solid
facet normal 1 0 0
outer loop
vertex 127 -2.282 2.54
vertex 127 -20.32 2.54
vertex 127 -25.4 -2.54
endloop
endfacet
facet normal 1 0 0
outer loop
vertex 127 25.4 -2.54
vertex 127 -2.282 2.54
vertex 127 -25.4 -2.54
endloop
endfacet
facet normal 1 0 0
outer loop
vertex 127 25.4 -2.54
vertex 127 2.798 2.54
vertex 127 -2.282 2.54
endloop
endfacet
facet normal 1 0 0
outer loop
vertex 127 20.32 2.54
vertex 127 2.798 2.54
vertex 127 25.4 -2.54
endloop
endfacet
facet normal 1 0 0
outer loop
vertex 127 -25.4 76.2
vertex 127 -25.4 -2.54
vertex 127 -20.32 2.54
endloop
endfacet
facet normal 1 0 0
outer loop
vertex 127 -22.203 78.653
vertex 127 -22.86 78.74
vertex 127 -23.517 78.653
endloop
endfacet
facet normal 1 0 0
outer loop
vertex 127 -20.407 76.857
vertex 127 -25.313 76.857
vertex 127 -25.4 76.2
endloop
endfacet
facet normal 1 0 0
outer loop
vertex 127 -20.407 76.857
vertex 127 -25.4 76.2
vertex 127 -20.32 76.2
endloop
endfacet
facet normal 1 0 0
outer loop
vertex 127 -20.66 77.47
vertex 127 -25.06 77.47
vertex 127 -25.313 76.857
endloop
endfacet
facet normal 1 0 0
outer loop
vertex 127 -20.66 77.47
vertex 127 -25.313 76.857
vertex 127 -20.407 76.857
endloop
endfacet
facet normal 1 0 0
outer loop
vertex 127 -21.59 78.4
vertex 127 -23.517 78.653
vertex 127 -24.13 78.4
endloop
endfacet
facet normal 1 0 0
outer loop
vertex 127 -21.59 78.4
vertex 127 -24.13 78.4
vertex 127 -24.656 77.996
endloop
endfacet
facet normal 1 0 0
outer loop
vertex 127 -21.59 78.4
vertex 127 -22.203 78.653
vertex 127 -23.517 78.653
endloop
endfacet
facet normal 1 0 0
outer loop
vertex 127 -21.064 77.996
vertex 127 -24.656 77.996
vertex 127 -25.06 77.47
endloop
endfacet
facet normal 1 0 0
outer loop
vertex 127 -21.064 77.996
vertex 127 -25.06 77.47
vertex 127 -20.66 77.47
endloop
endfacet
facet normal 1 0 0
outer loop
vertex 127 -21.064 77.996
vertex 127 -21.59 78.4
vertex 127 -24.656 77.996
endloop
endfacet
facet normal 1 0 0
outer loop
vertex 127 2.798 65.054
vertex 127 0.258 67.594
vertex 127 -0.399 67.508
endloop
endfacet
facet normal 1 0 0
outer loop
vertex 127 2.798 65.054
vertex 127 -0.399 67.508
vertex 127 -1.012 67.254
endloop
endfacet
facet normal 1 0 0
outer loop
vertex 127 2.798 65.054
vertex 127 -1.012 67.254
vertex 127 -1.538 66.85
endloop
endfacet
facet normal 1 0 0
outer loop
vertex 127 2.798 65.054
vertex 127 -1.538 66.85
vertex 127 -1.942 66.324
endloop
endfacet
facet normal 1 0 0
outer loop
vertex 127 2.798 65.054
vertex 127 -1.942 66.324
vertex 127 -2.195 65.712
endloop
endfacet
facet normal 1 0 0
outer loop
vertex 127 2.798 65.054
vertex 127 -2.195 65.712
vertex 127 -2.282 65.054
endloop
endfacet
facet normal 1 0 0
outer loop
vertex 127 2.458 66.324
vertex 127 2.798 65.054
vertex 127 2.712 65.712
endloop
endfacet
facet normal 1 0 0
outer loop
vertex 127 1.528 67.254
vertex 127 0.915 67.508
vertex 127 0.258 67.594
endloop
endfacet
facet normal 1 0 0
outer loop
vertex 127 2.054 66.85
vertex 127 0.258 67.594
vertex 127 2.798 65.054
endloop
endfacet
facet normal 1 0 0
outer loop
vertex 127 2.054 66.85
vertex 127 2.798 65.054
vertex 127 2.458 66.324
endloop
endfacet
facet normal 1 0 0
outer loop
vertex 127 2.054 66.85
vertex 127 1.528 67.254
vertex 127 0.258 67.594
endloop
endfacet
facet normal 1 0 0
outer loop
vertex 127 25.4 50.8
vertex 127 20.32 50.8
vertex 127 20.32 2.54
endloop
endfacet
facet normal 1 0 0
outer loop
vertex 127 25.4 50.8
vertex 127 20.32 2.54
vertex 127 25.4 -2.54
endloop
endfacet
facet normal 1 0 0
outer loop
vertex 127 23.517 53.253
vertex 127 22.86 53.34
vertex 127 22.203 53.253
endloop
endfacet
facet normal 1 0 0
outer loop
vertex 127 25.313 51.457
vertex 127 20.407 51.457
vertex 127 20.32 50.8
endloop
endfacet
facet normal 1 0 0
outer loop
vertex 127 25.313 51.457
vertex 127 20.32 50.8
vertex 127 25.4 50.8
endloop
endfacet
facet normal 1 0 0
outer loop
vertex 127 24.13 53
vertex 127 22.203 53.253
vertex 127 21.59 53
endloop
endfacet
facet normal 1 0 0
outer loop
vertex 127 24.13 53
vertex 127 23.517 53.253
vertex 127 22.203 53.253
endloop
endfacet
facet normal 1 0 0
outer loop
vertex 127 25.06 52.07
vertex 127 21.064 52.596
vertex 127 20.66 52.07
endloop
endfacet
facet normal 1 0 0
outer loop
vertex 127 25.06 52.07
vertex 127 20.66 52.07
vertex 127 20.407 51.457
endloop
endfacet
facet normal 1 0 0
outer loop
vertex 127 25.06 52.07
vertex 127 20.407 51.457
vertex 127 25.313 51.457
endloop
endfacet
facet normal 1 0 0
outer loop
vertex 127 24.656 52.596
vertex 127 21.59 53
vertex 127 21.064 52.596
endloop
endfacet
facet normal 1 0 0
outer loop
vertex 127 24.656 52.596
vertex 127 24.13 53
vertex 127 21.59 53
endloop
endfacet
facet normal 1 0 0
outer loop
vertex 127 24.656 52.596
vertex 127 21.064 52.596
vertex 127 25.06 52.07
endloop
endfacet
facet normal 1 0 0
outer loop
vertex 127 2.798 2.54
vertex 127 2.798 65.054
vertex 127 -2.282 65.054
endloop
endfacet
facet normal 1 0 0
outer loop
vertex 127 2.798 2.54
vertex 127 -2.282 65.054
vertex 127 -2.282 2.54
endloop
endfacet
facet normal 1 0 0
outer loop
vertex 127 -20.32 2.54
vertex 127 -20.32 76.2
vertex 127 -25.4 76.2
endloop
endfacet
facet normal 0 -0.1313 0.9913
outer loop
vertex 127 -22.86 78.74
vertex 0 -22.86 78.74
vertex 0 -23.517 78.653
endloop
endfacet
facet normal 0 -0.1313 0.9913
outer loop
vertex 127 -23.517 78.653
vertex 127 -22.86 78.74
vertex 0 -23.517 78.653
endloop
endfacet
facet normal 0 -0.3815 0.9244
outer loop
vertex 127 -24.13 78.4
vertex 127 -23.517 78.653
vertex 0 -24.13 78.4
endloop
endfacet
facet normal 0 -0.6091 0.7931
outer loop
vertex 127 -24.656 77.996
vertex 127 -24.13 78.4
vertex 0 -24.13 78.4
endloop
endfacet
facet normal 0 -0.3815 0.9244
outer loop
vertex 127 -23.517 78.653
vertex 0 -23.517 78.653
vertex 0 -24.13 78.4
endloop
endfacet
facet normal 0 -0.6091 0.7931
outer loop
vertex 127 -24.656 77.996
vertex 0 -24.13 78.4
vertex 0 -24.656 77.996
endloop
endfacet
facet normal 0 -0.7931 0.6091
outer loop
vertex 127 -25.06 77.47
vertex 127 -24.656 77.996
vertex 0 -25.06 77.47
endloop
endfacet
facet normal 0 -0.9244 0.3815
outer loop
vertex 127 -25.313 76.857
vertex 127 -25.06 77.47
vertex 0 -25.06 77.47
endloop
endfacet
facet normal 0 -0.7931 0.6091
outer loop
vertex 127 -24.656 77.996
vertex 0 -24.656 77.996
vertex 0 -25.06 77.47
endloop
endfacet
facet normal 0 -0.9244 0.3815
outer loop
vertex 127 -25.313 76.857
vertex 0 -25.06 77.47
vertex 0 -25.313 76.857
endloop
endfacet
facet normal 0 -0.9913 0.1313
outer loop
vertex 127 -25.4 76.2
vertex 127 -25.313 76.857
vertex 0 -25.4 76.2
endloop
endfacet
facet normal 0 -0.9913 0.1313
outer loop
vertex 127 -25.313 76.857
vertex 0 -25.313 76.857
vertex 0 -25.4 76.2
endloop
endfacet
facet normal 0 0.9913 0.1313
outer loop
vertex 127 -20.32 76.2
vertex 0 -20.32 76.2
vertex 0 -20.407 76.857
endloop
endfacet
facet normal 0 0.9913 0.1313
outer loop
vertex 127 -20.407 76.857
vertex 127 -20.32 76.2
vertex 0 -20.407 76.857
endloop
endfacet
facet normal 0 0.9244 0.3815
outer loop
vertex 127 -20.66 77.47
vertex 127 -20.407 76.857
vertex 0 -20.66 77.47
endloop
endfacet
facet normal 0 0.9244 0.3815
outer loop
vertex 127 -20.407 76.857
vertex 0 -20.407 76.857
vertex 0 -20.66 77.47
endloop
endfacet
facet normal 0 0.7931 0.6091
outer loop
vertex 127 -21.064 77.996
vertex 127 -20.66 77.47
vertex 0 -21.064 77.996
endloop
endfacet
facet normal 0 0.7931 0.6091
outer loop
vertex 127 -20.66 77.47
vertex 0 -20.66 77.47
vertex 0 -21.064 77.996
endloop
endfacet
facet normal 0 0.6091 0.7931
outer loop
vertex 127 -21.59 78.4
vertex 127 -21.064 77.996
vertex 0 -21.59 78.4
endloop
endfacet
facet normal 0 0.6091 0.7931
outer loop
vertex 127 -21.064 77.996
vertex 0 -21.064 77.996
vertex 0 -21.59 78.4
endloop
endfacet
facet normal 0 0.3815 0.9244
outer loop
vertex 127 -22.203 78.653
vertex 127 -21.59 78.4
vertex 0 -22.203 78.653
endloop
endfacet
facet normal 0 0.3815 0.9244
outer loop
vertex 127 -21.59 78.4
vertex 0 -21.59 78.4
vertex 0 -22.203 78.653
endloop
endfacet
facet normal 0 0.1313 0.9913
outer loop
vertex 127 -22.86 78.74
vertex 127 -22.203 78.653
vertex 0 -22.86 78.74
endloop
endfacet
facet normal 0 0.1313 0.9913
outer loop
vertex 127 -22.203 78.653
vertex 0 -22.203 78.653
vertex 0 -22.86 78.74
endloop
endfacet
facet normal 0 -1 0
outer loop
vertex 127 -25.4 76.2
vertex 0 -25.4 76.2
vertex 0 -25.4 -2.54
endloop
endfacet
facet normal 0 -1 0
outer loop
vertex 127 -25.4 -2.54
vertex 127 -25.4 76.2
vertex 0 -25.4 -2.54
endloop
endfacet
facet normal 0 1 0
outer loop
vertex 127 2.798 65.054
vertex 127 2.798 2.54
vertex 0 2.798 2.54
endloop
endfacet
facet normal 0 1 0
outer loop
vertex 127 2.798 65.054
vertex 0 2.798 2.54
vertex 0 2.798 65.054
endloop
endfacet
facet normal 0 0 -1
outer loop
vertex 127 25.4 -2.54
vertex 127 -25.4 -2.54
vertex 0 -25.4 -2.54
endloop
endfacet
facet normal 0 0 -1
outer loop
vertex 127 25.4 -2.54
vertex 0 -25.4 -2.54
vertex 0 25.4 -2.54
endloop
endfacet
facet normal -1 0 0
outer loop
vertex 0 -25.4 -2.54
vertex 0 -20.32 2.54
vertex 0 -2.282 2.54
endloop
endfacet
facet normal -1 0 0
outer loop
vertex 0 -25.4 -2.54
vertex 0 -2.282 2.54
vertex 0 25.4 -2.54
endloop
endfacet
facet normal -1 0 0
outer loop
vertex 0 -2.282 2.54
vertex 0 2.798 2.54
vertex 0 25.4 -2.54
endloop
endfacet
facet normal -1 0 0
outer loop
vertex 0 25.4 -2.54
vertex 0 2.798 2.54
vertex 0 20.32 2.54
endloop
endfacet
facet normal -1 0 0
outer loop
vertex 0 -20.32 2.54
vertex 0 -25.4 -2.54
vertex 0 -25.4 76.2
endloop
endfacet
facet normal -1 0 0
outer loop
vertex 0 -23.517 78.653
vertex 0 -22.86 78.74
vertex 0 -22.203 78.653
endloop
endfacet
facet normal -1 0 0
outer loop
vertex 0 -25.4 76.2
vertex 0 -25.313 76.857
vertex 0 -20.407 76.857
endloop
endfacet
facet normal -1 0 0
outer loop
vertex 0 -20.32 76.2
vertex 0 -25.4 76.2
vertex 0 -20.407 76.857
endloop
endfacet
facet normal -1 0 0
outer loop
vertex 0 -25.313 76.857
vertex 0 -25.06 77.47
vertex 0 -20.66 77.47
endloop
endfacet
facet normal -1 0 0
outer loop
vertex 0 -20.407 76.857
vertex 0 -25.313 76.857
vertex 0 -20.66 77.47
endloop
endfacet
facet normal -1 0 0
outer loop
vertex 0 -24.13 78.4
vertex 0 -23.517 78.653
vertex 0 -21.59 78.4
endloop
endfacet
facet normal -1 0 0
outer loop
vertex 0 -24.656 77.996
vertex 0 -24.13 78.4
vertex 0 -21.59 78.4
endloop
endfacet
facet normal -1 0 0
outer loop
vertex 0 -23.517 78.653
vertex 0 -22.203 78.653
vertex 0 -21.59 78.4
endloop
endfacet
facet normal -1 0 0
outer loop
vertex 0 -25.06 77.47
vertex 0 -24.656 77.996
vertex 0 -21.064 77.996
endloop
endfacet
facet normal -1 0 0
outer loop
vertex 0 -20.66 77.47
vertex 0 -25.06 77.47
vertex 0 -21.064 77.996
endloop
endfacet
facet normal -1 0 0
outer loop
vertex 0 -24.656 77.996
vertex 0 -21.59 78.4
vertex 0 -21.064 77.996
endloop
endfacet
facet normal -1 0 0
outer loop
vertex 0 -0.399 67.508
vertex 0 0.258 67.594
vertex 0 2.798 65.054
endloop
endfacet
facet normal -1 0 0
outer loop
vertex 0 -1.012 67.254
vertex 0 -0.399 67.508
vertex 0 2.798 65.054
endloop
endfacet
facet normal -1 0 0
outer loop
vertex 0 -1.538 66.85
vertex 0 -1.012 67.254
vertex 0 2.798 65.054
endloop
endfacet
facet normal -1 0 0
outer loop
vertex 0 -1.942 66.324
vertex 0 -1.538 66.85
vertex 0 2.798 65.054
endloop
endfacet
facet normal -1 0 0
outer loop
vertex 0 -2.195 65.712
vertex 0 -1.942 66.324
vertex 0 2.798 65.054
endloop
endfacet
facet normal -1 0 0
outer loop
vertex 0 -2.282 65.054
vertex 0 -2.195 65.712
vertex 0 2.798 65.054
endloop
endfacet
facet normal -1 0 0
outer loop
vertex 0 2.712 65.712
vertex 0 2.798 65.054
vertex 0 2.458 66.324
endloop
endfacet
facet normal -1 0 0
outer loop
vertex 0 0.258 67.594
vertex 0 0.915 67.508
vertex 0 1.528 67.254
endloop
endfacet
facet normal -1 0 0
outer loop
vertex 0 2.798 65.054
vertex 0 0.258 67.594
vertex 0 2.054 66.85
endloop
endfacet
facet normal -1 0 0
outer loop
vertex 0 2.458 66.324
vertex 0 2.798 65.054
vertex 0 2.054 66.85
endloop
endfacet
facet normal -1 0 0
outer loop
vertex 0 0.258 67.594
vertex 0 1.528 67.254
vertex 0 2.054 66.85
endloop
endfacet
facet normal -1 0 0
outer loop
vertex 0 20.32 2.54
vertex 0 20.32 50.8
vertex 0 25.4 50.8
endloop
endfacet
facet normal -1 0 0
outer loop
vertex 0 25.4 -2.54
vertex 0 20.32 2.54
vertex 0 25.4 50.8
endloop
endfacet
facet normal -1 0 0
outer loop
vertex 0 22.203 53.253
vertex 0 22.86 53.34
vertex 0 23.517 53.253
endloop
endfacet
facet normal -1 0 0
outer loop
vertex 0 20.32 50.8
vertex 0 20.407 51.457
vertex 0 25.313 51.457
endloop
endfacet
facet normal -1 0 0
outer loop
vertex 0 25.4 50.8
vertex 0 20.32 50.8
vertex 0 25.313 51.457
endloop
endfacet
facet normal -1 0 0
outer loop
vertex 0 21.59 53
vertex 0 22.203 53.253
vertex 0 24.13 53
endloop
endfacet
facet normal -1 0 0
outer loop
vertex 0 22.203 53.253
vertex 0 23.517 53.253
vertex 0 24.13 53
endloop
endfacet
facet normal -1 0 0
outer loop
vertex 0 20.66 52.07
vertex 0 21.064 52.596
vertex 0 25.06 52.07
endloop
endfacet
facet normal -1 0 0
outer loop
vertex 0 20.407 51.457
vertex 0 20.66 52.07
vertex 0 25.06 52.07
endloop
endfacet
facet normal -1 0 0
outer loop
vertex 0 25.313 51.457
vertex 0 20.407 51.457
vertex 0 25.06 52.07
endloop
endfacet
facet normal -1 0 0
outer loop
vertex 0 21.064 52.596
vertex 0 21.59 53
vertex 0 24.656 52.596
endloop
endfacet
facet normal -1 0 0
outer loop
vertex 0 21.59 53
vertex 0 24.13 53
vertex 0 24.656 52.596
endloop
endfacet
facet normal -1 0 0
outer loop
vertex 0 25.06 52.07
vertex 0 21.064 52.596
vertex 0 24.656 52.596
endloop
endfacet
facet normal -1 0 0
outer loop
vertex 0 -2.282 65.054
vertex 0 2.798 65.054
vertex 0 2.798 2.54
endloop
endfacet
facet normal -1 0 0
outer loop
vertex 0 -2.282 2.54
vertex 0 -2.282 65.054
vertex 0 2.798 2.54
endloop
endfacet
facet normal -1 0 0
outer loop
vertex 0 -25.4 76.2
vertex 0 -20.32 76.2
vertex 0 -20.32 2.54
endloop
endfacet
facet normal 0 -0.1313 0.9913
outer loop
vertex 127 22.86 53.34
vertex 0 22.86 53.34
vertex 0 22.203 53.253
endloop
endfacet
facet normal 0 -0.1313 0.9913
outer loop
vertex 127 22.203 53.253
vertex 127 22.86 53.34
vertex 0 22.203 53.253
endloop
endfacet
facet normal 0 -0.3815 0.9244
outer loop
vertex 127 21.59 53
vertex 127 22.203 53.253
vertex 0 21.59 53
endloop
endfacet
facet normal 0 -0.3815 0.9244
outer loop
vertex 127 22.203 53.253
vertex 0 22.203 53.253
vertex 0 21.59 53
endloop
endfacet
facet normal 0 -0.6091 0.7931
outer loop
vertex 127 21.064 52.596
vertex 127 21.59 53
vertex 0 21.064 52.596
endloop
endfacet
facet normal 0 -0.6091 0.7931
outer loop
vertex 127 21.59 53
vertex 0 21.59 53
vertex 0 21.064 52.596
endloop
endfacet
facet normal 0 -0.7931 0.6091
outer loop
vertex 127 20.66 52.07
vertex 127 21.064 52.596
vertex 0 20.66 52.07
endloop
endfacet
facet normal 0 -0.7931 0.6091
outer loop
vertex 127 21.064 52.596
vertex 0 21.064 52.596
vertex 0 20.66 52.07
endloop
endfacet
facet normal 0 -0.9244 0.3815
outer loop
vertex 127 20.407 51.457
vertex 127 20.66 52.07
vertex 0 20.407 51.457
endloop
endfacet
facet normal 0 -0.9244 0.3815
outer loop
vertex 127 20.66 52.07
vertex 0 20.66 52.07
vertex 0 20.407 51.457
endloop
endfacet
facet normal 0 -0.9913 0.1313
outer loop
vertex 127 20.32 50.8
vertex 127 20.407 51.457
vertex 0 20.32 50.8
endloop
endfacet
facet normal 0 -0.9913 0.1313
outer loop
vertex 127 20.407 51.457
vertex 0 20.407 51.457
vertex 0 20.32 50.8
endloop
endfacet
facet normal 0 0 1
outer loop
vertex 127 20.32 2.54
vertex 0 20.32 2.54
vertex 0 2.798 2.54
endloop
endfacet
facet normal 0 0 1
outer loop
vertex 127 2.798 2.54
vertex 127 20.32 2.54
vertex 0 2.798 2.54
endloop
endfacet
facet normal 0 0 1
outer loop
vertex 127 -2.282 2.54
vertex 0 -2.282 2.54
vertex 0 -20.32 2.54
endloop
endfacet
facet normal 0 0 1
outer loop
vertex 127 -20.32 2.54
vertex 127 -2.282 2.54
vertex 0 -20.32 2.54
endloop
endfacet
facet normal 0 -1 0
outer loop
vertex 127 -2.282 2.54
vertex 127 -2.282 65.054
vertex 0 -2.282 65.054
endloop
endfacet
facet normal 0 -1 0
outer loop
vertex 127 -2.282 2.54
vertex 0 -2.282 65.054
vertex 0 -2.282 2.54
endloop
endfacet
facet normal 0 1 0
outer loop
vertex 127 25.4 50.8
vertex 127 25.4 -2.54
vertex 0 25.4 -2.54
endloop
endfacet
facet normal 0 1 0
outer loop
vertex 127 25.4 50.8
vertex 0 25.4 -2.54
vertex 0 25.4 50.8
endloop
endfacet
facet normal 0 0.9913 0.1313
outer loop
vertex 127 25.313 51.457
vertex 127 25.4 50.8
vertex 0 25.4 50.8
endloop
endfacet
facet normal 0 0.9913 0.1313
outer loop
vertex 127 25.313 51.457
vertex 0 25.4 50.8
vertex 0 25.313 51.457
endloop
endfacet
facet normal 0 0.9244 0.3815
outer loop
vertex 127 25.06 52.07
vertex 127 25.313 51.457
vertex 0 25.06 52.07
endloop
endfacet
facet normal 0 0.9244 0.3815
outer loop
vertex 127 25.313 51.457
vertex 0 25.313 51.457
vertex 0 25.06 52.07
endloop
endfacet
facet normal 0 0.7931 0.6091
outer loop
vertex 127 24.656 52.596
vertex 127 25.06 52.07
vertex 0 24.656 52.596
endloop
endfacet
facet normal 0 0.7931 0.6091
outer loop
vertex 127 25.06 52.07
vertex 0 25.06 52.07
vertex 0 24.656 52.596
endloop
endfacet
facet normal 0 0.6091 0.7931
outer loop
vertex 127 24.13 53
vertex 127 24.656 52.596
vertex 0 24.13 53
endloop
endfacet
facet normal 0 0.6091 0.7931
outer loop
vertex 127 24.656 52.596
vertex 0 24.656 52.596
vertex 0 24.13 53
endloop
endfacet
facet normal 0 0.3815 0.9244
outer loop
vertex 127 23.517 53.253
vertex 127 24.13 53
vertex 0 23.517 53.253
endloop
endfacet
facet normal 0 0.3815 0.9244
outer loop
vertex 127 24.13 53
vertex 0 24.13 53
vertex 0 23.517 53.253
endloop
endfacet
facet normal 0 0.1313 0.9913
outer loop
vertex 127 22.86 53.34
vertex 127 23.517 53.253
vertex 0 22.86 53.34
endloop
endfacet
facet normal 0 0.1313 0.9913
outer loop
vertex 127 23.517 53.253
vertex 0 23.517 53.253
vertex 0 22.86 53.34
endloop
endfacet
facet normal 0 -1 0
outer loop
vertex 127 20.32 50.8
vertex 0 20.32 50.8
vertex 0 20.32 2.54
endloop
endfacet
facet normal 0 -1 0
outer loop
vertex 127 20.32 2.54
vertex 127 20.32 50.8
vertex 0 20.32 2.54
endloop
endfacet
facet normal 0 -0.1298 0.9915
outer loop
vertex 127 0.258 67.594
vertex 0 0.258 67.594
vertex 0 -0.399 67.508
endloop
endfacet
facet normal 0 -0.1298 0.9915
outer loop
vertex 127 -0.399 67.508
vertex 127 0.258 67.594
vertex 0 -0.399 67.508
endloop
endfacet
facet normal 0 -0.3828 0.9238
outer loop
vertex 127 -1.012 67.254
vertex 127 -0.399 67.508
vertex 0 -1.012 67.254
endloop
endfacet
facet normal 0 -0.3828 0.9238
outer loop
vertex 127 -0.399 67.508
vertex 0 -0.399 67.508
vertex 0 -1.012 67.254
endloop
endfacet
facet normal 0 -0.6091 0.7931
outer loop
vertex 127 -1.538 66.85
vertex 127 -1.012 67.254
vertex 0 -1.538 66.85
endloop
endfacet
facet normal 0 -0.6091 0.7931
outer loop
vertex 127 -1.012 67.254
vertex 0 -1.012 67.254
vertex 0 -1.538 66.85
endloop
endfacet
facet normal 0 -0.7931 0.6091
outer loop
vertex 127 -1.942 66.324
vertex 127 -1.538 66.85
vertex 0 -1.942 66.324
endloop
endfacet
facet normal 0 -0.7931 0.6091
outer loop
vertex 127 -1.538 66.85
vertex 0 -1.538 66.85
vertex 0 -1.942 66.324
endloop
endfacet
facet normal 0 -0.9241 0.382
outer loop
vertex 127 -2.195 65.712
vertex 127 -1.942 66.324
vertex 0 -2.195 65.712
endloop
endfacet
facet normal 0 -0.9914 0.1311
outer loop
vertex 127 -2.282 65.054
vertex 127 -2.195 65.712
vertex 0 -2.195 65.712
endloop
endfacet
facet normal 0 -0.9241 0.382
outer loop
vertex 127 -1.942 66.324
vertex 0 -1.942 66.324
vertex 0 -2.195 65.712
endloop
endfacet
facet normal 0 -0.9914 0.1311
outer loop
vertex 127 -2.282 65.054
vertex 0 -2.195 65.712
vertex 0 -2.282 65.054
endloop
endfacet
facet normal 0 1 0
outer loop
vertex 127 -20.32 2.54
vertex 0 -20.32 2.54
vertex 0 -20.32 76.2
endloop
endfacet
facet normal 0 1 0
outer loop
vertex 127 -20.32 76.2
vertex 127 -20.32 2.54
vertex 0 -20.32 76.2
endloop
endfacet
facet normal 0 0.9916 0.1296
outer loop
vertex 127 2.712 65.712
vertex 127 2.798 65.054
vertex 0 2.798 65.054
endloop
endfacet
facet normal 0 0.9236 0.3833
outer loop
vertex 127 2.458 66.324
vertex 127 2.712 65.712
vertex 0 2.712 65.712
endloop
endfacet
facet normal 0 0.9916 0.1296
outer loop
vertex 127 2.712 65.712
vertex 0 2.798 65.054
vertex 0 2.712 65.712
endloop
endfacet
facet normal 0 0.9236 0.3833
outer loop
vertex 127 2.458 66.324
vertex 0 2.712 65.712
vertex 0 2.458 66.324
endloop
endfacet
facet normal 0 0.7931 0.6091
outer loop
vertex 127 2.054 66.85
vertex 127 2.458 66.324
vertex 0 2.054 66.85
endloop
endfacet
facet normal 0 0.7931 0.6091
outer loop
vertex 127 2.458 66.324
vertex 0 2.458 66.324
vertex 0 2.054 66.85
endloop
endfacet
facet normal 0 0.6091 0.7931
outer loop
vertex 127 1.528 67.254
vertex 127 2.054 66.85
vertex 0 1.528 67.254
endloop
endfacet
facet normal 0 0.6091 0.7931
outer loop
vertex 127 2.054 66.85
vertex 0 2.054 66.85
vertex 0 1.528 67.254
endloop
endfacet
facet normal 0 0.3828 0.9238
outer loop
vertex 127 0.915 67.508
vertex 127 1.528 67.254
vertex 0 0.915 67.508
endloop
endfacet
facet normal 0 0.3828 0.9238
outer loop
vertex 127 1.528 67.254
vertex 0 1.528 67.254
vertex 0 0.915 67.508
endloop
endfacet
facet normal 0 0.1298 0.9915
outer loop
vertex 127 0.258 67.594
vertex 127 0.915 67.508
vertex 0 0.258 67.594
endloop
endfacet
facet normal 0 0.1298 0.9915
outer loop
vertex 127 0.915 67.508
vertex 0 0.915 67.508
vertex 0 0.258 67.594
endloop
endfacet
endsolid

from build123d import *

# Parameters (mm, degrees)
F1_DEPTH = 127


with BuildPart() as f1:
    # F0 (on Right) → F1 (new body)
    with BuildSketch(Plane.YZ):
        with BuildLine():
            Line((-25.4, 76.2), (-25.4, 2.54))
            Line((-25.4, 2.54), (-20.32, 2.54))
            Line((-20.32, 2.54), (-20.32, 76.2))
            ThreePointArc((-20.32, 76.2), (-21.063949, 77.996051), (-22.86, 78.74))
            ThreePointArc((-22.86, 78.74), (-24.656051, 77.996051), (-25.4, 76.2))
        make_face()
        Polygon((-20.32, 2.54), (-25.4, 2.54), (-25.4, -2.54), (25.4, -2.54), (25.4, 2.54), (20.32, 2.54), (2.798074, 2.54), (-2.281926, 2.54), align=None)
        with BuildLine():
            Line((-2.281926, 65.054222), (-2.281926, 2.54))
            Line((-2.281926, 2.54), (2.798074, 2.54))
            Line((2.798074, 2.54), (2.798074, 65.054222))
            ThreePointArc((2.798074, 65.054222), (2.054126, 66.850273), (0.258074, 67.594222))
            ThreePointArc((0.258074, 67.594222), (-1.537977, 66.850273), (-2.281926, 65.054222))
        make_face()
        with BuildLine():
            Line((20.32, 2.54), (25.4, 2.54))
            Line((25.4, 2.54), (25.4, 50.8))
            ThreePointArc((25.4, 50.8), (24.656051, 52.596051), (22.86, 53.34))
            ThreePointArc((22.86, 53.34), (21.063949, 52.596051), (20.32, 50.8))
            Line((20.32, 50.8), (20.32, 2.54))
        make_face()
    extrude(amount=F1_DEPTH)


solid = f1.part
